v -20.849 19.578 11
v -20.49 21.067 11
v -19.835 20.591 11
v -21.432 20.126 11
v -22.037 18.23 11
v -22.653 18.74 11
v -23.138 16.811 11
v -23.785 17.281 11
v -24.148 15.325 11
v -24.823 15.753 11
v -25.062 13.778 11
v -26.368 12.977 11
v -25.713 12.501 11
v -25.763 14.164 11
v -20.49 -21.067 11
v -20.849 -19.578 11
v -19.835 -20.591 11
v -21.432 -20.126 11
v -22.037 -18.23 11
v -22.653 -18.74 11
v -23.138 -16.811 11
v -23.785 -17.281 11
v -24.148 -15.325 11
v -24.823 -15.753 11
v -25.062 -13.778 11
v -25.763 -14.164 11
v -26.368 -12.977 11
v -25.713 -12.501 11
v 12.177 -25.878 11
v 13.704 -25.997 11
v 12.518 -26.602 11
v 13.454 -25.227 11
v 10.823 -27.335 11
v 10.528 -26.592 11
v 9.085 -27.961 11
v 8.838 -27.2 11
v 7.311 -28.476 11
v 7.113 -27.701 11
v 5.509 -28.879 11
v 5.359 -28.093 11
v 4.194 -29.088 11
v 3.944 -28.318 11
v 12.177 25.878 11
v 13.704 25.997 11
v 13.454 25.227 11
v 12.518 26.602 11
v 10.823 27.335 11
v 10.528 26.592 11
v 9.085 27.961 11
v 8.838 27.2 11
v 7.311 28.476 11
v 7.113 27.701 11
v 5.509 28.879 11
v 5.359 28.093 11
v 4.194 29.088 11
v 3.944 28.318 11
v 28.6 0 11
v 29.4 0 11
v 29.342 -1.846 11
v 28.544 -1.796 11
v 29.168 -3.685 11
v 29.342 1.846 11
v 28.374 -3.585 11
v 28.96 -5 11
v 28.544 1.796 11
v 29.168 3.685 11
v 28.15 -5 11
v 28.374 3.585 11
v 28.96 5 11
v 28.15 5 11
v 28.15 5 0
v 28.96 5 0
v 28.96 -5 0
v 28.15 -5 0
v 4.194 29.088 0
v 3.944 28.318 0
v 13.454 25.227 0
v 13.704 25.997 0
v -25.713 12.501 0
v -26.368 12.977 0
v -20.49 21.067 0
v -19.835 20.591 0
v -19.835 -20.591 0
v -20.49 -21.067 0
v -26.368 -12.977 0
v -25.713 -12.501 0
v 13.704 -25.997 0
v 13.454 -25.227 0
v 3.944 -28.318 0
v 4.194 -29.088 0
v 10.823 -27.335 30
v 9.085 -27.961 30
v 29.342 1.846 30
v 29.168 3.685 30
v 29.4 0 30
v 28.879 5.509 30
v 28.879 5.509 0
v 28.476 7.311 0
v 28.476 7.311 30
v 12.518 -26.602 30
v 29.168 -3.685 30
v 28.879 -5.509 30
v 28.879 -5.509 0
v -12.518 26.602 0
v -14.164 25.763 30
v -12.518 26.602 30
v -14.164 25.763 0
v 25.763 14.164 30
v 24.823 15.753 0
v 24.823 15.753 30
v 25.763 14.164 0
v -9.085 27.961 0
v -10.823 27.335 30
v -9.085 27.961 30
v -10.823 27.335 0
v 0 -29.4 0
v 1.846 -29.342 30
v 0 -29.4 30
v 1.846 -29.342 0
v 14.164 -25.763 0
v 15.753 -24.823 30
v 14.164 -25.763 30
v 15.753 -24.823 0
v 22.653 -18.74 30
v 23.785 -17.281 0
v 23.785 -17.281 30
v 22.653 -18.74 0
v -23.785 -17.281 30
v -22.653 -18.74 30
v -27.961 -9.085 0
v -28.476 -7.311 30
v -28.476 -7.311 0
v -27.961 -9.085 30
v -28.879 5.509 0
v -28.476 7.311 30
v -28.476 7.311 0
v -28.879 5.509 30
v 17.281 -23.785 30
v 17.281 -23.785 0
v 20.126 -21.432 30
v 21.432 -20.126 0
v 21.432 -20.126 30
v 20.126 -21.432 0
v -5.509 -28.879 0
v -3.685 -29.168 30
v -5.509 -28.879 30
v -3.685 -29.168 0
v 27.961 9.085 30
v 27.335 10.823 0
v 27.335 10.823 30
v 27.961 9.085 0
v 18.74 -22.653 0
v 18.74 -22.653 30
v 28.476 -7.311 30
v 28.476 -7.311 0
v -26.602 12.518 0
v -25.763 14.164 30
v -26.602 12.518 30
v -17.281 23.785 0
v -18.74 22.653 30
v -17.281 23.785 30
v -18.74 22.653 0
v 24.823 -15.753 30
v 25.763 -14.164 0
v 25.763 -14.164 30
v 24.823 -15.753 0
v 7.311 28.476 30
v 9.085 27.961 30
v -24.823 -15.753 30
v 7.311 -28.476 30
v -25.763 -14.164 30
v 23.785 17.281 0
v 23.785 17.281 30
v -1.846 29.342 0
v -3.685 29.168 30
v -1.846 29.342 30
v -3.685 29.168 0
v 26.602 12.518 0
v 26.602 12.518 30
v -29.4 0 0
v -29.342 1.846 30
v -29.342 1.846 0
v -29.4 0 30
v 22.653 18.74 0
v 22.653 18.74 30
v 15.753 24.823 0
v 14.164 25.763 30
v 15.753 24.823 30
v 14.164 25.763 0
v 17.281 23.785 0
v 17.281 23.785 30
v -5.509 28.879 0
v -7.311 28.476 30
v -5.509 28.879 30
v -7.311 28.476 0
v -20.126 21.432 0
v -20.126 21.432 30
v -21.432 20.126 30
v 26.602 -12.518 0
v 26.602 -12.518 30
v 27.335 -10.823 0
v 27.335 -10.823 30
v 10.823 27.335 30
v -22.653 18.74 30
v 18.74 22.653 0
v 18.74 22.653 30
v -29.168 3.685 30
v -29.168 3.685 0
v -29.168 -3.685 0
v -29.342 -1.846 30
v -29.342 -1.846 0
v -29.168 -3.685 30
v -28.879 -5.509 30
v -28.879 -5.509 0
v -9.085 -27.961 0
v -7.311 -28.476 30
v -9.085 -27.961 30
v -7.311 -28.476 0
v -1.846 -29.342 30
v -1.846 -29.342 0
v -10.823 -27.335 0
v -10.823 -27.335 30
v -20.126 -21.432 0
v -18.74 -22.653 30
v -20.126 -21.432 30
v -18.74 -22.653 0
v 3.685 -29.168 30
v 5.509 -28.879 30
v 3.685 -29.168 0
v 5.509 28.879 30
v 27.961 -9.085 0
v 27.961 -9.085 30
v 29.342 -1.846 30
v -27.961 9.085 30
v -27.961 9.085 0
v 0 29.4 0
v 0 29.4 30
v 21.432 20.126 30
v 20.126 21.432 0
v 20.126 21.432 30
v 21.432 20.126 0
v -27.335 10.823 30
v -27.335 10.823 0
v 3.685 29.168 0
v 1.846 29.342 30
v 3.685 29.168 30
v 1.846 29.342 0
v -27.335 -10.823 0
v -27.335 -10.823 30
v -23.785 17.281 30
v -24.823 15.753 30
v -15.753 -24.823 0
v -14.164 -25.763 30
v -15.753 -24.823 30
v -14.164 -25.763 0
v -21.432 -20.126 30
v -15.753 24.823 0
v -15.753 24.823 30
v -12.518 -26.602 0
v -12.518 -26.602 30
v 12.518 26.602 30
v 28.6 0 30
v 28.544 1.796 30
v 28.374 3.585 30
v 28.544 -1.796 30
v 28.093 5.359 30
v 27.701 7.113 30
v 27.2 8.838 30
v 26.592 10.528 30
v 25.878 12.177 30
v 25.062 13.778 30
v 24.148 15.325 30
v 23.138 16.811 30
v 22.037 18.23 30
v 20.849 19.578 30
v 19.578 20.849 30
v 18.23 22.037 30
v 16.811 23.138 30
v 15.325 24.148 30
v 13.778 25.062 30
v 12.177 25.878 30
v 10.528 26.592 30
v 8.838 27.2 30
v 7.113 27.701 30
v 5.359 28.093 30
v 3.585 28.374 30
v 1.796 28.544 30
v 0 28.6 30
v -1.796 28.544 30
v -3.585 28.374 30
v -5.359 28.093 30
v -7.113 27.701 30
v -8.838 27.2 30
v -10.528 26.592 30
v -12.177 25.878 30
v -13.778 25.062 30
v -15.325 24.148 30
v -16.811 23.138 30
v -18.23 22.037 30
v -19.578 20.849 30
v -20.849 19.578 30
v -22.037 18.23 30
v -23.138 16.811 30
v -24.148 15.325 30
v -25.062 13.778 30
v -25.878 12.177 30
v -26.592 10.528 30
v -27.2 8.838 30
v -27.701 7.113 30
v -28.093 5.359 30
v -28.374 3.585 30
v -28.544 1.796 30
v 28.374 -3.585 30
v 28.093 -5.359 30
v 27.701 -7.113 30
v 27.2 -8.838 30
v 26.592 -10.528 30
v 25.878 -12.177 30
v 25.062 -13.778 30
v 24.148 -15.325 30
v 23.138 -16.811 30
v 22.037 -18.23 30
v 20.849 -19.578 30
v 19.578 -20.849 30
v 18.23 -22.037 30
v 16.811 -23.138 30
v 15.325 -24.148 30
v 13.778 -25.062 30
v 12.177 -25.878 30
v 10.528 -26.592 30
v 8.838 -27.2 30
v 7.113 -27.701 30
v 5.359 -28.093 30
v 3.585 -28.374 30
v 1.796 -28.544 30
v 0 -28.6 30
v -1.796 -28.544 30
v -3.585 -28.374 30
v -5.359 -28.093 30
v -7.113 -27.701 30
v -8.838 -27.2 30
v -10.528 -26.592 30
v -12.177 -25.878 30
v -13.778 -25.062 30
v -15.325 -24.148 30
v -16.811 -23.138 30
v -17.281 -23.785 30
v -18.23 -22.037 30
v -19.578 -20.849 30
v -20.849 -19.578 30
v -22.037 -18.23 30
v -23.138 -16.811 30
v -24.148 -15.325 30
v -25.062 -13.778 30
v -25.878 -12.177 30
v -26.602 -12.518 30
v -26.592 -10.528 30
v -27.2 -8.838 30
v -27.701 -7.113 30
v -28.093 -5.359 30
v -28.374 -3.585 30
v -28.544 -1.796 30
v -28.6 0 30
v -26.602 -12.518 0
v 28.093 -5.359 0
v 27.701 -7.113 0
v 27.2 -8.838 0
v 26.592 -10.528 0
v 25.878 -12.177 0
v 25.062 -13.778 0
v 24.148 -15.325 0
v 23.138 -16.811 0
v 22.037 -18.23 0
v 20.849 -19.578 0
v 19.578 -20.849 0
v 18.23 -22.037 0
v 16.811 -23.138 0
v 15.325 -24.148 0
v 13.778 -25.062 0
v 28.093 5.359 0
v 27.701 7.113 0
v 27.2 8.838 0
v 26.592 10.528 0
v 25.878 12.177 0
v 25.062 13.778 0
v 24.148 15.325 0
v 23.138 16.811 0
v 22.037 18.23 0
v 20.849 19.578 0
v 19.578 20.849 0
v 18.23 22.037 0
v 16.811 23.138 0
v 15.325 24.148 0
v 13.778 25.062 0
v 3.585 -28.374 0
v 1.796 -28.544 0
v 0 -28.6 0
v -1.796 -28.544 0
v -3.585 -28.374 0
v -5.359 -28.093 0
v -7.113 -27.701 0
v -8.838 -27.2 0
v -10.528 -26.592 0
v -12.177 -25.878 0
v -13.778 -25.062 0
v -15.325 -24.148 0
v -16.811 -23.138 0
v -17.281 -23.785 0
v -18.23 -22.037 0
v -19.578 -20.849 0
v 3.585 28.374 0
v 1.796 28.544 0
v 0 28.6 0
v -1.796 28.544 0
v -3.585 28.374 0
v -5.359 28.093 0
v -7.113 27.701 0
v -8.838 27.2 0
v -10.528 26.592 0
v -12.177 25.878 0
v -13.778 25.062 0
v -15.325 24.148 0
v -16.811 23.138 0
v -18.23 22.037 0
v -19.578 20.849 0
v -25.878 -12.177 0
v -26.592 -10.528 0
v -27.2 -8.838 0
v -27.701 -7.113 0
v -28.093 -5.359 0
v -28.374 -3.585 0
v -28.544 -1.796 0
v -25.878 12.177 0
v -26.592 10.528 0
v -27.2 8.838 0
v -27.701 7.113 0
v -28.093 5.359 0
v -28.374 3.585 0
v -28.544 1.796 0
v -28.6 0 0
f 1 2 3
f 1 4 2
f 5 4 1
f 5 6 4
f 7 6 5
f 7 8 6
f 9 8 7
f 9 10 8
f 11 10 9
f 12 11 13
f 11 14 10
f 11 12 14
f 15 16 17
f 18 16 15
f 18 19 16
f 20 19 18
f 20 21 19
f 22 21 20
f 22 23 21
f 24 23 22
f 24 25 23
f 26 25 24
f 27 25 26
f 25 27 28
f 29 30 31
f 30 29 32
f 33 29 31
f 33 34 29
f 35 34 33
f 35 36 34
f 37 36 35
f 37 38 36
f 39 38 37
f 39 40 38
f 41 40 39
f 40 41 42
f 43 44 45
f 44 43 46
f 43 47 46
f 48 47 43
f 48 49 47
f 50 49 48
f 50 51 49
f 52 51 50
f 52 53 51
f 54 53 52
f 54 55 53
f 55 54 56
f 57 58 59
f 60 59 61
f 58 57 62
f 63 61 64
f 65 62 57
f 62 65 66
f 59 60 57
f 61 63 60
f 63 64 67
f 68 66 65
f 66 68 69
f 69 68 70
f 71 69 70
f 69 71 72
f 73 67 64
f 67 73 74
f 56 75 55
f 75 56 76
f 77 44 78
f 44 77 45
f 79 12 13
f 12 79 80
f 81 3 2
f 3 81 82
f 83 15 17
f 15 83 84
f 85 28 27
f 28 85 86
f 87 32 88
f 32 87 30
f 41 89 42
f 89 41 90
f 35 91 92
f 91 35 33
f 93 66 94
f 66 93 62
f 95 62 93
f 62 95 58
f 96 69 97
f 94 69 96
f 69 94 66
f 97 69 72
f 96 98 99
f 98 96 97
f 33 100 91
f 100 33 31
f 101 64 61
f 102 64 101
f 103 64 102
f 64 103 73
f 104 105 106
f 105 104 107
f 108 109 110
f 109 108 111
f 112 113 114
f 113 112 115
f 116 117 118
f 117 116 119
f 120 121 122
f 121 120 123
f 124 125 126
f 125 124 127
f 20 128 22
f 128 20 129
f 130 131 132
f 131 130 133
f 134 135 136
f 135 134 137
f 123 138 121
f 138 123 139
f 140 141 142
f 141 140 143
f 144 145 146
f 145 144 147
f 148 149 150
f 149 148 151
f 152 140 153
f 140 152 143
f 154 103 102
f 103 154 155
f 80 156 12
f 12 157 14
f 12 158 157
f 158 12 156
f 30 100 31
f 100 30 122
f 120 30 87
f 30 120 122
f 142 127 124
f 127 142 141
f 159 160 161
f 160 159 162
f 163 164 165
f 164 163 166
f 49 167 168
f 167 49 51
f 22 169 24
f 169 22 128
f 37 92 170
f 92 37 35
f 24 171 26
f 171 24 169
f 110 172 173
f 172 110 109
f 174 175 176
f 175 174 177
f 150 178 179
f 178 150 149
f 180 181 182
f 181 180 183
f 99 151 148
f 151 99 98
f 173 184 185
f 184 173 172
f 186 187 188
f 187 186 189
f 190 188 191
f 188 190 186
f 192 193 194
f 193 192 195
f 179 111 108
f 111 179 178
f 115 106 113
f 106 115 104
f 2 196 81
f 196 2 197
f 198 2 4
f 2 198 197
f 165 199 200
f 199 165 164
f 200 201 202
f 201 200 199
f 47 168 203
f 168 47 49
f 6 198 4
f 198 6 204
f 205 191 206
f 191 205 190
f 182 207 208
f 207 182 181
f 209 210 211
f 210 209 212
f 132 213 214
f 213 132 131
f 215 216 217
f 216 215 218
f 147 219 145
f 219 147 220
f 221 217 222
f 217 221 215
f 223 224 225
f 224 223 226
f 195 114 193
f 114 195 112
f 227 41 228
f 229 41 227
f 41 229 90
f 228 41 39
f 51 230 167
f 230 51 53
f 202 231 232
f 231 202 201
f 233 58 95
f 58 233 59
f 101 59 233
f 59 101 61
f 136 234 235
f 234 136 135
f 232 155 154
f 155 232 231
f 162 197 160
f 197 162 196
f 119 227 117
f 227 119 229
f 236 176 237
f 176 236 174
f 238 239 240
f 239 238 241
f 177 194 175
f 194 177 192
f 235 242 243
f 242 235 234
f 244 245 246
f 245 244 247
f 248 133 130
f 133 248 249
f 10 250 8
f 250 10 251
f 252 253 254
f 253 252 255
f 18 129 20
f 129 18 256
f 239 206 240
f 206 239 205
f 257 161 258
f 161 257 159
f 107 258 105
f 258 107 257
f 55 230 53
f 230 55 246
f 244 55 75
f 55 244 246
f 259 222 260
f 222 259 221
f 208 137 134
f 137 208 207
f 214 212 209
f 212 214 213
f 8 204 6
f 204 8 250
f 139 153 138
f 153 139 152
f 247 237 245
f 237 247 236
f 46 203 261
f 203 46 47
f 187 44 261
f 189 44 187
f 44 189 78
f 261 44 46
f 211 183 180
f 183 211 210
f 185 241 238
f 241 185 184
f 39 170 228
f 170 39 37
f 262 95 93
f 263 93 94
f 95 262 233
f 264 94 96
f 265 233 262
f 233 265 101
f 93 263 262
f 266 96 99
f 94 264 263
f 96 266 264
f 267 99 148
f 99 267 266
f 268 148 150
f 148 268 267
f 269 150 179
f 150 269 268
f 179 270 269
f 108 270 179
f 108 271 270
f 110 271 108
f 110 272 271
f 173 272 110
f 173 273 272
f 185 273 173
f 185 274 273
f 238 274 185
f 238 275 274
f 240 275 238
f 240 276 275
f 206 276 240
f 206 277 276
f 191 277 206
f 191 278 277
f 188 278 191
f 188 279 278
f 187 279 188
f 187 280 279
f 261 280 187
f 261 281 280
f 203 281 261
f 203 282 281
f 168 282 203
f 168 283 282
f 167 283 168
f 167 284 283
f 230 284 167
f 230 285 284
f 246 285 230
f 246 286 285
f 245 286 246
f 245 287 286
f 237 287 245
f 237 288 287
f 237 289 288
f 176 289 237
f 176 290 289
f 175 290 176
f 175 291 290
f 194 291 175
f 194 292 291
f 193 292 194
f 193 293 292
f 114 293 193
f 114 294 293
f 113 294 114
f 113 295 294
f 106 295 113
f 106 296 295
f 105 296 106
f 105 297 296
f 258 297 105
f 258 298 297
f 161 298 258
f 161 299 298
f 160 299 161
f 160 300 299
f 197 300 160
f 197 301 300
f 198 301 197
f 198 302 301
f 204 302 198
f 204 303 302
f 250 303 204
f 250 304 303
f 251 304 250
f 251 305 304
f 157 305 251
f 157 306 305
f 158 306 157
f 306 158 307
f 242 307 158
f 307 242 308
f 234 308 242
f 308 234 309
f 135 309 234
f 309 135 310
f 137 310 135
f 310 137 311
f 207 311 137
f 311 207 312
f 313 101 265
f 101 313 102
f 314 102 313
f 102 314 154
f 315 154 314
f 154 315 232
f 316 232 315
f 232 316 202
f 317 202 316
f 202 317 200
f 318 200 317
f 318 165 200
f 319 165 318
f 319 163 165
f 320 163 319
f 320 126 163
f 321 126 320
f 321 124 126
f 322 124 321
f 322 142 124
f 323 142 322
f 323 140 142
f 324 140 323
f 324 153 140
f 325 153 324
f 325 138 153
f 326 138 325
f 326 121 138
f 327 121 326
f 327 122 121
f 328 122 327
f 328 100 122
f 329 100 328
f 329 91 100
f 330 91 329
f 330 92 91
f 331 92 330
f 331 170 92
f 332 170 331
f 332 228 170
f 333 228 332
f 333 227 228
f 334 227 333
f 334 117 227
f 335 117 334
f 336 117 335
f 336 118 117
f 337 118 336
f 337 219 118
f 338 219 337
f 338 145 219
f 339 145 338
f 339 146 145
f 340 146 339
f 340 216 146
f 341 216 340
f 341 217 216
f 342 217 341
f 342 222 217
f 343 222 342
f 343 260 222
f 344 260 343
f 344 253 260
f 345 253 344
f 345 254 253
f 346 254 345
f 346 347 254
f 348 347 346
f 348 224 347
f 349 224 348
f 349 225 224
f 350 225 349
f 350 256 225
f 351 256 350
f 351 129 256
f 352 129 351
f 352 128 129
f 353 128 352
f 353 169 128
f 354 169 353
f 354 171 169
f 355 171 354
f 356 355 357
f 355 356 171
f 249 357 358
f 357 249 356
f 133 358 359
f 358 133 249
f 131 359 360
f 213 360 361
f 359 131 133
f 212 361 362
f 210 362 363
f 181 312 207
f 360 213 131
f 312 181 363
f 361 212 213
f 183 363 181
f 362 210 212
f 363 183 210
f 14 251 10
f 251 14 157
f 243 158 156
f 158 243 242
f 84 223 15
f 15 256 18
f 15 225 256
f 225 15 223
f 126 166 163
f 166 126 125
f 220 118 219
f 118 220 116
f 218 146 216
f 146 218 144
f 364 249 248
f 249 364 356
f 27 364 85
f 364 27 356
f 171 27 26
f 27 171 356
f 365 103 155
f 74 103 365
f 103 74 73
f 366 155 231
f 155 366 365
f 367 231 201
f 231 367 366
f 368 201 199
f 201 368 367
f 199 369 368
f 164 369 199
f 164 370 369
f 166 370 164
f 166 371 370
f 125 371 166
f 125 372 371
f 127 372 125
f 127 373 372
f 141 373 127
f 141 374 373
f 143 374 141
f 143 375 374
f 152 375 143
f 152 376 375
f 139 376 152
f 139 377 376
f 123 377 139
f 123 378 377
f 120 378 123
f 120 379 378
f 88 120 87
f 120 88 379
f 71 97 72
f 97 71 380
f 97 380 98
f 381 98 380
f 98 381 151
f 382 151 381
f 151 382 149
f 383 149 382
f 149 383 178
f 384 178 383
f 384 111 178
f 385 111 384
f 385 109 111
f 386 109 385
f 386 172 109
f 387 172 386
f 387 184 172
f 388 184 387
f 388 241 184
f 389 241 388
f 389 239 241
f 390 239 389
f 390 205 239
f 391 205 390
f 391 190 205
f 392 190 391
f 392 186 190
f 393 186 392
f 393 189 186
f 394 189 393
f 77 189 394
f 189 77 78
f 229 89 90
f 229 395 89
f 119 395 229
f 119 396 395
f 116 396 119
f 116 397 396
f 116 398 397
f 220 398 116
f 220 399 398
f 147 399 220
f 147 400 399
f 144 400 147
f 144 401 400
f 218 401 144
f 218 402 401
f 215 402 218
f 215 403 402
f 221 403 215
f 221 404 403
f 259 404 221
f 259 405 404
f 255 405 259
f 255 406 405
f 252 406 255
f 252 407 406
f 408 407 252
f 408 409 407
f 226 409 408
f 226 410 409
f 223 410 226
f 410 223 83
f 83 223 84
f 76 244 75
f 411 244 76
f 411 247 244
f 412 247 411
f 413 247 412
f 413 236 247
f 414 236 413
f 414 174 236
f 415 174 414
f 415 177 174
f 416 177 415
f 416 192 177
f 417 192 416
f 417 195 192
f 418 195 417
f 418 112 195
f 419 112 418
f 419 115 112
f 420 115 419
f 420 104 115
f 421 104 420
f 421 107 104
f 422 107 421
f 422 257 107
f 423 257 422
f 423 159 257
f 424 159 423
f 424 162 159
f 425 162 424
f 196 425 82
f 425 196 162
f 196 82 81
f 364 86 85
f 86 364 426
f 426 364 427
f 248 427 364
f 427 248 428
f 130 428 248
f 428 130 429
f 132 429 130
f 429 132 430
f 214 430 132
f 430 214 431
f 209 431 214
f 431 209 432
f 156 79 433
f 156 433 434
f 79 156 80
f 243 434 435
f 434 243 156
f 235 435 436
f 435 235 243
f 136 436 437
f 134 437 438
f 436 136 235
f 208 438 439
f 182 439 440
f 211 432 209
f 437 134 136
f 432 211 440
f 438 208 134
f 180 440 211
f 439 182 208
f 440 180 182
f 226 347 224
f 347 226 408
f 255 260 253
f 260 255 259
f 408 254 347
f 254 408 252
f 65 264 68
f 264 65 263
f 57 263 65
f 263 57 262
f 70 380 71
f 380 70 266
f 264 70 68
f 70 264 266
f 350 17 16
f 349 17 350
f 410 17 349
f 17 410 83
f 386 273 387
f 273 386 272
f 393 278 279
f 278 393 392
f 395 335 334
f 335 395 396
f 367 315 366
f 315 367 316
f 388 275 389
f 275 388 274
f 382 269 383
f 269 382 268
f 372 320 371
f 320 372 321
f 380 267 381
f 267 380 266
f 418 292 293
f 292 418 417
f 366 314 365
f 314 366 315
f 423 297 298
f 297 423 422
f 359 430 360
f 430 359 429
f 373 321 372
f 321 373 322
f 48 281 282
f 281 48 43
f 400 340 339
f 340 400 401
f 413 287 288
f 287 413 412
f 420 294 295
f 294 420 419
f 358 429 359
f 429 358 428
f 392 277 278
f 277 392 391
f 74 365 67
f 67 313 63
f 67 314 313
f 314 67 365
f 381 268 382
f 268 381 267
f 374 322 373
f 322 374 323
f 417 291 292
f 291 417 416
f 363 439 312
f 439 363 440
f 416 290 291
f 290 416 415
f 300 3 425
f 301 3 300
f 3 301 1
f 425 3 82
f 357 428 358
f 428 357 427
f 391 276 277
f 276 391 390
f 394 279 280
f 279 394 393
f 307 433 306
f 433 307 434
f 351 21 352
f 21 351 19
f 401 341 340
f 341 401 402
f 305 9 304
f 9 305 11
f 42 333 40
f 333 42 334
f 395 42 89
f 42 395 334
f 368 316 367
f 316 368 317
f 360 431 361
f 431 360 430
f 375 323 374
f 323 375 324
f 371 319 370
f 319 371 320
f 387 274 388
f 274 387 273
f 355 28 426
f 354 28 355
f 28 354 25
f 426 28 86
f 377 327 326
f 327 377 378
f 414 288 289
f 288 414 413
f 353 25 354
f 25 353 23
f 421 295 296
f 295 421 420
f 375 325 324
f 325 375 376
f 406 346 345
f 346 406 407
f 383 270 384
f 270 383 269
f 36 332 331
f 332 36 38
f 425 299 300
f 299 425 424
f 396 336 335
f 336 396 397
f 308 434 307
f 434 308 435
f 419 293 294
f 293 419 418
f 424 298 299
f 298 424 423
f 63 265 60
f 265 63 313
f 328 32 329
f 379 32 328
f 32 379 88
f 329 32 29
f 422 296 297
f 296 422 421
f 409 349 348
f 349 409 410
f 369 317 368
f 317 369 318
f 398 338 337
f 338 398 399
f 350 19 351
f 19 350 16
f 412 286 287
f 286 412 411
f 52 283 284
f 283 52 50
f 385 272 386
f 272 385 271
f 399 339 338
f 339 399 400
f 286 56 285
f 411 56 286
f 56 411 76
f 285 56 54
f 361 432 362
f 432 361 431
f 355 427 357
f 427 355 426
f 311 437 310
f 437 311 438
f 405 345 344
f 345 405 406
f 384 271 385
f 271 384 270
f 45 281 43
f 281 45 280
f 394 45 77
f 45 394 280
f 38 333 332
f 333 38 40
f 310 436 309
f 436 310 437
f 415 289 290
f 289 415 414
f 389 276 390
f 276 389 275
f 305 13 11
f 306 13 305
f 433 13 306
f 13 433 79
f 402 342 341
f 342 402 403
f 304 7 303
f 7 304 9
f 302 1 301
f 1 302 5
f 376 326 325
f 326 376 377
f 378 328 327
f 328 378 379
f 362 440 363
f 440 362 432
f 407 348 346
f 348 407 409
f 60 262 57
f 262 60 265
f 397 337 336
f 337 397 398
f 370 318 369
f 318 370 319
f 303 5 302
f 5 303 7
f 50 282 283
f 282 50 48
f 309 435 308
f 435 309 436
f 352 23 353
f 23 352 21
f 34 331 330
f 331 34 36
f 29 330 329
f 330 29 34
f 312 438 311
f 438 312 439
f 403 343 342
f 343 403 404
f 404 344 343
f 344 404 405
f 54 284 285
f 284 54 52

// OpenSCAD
// outer diameter
$outer_d = 59-0.2; // Fixme: measure

// inner diameter
$inner_d = 57+0.2; // Fixme: measure

// height
$height = 30; // Fixme: test

// square hole
$hole_x = 10; // Fixme: measure
$hole_y = 11; // Fixme: measure

$fn = 100;

difference() {
    cylinder($height, $outer_d/2, $outer_d/2);
    translate([0,0,-1])
        cylinder($height+2,$inner_d/2,$inner_d/2);
 
    for (a =[0:72:360]) rotate([0,0,a])
        translate([0,-$hole_x/2,-1])
            cube([$outer_d,$hole_x,$hole_y+1]);
}
